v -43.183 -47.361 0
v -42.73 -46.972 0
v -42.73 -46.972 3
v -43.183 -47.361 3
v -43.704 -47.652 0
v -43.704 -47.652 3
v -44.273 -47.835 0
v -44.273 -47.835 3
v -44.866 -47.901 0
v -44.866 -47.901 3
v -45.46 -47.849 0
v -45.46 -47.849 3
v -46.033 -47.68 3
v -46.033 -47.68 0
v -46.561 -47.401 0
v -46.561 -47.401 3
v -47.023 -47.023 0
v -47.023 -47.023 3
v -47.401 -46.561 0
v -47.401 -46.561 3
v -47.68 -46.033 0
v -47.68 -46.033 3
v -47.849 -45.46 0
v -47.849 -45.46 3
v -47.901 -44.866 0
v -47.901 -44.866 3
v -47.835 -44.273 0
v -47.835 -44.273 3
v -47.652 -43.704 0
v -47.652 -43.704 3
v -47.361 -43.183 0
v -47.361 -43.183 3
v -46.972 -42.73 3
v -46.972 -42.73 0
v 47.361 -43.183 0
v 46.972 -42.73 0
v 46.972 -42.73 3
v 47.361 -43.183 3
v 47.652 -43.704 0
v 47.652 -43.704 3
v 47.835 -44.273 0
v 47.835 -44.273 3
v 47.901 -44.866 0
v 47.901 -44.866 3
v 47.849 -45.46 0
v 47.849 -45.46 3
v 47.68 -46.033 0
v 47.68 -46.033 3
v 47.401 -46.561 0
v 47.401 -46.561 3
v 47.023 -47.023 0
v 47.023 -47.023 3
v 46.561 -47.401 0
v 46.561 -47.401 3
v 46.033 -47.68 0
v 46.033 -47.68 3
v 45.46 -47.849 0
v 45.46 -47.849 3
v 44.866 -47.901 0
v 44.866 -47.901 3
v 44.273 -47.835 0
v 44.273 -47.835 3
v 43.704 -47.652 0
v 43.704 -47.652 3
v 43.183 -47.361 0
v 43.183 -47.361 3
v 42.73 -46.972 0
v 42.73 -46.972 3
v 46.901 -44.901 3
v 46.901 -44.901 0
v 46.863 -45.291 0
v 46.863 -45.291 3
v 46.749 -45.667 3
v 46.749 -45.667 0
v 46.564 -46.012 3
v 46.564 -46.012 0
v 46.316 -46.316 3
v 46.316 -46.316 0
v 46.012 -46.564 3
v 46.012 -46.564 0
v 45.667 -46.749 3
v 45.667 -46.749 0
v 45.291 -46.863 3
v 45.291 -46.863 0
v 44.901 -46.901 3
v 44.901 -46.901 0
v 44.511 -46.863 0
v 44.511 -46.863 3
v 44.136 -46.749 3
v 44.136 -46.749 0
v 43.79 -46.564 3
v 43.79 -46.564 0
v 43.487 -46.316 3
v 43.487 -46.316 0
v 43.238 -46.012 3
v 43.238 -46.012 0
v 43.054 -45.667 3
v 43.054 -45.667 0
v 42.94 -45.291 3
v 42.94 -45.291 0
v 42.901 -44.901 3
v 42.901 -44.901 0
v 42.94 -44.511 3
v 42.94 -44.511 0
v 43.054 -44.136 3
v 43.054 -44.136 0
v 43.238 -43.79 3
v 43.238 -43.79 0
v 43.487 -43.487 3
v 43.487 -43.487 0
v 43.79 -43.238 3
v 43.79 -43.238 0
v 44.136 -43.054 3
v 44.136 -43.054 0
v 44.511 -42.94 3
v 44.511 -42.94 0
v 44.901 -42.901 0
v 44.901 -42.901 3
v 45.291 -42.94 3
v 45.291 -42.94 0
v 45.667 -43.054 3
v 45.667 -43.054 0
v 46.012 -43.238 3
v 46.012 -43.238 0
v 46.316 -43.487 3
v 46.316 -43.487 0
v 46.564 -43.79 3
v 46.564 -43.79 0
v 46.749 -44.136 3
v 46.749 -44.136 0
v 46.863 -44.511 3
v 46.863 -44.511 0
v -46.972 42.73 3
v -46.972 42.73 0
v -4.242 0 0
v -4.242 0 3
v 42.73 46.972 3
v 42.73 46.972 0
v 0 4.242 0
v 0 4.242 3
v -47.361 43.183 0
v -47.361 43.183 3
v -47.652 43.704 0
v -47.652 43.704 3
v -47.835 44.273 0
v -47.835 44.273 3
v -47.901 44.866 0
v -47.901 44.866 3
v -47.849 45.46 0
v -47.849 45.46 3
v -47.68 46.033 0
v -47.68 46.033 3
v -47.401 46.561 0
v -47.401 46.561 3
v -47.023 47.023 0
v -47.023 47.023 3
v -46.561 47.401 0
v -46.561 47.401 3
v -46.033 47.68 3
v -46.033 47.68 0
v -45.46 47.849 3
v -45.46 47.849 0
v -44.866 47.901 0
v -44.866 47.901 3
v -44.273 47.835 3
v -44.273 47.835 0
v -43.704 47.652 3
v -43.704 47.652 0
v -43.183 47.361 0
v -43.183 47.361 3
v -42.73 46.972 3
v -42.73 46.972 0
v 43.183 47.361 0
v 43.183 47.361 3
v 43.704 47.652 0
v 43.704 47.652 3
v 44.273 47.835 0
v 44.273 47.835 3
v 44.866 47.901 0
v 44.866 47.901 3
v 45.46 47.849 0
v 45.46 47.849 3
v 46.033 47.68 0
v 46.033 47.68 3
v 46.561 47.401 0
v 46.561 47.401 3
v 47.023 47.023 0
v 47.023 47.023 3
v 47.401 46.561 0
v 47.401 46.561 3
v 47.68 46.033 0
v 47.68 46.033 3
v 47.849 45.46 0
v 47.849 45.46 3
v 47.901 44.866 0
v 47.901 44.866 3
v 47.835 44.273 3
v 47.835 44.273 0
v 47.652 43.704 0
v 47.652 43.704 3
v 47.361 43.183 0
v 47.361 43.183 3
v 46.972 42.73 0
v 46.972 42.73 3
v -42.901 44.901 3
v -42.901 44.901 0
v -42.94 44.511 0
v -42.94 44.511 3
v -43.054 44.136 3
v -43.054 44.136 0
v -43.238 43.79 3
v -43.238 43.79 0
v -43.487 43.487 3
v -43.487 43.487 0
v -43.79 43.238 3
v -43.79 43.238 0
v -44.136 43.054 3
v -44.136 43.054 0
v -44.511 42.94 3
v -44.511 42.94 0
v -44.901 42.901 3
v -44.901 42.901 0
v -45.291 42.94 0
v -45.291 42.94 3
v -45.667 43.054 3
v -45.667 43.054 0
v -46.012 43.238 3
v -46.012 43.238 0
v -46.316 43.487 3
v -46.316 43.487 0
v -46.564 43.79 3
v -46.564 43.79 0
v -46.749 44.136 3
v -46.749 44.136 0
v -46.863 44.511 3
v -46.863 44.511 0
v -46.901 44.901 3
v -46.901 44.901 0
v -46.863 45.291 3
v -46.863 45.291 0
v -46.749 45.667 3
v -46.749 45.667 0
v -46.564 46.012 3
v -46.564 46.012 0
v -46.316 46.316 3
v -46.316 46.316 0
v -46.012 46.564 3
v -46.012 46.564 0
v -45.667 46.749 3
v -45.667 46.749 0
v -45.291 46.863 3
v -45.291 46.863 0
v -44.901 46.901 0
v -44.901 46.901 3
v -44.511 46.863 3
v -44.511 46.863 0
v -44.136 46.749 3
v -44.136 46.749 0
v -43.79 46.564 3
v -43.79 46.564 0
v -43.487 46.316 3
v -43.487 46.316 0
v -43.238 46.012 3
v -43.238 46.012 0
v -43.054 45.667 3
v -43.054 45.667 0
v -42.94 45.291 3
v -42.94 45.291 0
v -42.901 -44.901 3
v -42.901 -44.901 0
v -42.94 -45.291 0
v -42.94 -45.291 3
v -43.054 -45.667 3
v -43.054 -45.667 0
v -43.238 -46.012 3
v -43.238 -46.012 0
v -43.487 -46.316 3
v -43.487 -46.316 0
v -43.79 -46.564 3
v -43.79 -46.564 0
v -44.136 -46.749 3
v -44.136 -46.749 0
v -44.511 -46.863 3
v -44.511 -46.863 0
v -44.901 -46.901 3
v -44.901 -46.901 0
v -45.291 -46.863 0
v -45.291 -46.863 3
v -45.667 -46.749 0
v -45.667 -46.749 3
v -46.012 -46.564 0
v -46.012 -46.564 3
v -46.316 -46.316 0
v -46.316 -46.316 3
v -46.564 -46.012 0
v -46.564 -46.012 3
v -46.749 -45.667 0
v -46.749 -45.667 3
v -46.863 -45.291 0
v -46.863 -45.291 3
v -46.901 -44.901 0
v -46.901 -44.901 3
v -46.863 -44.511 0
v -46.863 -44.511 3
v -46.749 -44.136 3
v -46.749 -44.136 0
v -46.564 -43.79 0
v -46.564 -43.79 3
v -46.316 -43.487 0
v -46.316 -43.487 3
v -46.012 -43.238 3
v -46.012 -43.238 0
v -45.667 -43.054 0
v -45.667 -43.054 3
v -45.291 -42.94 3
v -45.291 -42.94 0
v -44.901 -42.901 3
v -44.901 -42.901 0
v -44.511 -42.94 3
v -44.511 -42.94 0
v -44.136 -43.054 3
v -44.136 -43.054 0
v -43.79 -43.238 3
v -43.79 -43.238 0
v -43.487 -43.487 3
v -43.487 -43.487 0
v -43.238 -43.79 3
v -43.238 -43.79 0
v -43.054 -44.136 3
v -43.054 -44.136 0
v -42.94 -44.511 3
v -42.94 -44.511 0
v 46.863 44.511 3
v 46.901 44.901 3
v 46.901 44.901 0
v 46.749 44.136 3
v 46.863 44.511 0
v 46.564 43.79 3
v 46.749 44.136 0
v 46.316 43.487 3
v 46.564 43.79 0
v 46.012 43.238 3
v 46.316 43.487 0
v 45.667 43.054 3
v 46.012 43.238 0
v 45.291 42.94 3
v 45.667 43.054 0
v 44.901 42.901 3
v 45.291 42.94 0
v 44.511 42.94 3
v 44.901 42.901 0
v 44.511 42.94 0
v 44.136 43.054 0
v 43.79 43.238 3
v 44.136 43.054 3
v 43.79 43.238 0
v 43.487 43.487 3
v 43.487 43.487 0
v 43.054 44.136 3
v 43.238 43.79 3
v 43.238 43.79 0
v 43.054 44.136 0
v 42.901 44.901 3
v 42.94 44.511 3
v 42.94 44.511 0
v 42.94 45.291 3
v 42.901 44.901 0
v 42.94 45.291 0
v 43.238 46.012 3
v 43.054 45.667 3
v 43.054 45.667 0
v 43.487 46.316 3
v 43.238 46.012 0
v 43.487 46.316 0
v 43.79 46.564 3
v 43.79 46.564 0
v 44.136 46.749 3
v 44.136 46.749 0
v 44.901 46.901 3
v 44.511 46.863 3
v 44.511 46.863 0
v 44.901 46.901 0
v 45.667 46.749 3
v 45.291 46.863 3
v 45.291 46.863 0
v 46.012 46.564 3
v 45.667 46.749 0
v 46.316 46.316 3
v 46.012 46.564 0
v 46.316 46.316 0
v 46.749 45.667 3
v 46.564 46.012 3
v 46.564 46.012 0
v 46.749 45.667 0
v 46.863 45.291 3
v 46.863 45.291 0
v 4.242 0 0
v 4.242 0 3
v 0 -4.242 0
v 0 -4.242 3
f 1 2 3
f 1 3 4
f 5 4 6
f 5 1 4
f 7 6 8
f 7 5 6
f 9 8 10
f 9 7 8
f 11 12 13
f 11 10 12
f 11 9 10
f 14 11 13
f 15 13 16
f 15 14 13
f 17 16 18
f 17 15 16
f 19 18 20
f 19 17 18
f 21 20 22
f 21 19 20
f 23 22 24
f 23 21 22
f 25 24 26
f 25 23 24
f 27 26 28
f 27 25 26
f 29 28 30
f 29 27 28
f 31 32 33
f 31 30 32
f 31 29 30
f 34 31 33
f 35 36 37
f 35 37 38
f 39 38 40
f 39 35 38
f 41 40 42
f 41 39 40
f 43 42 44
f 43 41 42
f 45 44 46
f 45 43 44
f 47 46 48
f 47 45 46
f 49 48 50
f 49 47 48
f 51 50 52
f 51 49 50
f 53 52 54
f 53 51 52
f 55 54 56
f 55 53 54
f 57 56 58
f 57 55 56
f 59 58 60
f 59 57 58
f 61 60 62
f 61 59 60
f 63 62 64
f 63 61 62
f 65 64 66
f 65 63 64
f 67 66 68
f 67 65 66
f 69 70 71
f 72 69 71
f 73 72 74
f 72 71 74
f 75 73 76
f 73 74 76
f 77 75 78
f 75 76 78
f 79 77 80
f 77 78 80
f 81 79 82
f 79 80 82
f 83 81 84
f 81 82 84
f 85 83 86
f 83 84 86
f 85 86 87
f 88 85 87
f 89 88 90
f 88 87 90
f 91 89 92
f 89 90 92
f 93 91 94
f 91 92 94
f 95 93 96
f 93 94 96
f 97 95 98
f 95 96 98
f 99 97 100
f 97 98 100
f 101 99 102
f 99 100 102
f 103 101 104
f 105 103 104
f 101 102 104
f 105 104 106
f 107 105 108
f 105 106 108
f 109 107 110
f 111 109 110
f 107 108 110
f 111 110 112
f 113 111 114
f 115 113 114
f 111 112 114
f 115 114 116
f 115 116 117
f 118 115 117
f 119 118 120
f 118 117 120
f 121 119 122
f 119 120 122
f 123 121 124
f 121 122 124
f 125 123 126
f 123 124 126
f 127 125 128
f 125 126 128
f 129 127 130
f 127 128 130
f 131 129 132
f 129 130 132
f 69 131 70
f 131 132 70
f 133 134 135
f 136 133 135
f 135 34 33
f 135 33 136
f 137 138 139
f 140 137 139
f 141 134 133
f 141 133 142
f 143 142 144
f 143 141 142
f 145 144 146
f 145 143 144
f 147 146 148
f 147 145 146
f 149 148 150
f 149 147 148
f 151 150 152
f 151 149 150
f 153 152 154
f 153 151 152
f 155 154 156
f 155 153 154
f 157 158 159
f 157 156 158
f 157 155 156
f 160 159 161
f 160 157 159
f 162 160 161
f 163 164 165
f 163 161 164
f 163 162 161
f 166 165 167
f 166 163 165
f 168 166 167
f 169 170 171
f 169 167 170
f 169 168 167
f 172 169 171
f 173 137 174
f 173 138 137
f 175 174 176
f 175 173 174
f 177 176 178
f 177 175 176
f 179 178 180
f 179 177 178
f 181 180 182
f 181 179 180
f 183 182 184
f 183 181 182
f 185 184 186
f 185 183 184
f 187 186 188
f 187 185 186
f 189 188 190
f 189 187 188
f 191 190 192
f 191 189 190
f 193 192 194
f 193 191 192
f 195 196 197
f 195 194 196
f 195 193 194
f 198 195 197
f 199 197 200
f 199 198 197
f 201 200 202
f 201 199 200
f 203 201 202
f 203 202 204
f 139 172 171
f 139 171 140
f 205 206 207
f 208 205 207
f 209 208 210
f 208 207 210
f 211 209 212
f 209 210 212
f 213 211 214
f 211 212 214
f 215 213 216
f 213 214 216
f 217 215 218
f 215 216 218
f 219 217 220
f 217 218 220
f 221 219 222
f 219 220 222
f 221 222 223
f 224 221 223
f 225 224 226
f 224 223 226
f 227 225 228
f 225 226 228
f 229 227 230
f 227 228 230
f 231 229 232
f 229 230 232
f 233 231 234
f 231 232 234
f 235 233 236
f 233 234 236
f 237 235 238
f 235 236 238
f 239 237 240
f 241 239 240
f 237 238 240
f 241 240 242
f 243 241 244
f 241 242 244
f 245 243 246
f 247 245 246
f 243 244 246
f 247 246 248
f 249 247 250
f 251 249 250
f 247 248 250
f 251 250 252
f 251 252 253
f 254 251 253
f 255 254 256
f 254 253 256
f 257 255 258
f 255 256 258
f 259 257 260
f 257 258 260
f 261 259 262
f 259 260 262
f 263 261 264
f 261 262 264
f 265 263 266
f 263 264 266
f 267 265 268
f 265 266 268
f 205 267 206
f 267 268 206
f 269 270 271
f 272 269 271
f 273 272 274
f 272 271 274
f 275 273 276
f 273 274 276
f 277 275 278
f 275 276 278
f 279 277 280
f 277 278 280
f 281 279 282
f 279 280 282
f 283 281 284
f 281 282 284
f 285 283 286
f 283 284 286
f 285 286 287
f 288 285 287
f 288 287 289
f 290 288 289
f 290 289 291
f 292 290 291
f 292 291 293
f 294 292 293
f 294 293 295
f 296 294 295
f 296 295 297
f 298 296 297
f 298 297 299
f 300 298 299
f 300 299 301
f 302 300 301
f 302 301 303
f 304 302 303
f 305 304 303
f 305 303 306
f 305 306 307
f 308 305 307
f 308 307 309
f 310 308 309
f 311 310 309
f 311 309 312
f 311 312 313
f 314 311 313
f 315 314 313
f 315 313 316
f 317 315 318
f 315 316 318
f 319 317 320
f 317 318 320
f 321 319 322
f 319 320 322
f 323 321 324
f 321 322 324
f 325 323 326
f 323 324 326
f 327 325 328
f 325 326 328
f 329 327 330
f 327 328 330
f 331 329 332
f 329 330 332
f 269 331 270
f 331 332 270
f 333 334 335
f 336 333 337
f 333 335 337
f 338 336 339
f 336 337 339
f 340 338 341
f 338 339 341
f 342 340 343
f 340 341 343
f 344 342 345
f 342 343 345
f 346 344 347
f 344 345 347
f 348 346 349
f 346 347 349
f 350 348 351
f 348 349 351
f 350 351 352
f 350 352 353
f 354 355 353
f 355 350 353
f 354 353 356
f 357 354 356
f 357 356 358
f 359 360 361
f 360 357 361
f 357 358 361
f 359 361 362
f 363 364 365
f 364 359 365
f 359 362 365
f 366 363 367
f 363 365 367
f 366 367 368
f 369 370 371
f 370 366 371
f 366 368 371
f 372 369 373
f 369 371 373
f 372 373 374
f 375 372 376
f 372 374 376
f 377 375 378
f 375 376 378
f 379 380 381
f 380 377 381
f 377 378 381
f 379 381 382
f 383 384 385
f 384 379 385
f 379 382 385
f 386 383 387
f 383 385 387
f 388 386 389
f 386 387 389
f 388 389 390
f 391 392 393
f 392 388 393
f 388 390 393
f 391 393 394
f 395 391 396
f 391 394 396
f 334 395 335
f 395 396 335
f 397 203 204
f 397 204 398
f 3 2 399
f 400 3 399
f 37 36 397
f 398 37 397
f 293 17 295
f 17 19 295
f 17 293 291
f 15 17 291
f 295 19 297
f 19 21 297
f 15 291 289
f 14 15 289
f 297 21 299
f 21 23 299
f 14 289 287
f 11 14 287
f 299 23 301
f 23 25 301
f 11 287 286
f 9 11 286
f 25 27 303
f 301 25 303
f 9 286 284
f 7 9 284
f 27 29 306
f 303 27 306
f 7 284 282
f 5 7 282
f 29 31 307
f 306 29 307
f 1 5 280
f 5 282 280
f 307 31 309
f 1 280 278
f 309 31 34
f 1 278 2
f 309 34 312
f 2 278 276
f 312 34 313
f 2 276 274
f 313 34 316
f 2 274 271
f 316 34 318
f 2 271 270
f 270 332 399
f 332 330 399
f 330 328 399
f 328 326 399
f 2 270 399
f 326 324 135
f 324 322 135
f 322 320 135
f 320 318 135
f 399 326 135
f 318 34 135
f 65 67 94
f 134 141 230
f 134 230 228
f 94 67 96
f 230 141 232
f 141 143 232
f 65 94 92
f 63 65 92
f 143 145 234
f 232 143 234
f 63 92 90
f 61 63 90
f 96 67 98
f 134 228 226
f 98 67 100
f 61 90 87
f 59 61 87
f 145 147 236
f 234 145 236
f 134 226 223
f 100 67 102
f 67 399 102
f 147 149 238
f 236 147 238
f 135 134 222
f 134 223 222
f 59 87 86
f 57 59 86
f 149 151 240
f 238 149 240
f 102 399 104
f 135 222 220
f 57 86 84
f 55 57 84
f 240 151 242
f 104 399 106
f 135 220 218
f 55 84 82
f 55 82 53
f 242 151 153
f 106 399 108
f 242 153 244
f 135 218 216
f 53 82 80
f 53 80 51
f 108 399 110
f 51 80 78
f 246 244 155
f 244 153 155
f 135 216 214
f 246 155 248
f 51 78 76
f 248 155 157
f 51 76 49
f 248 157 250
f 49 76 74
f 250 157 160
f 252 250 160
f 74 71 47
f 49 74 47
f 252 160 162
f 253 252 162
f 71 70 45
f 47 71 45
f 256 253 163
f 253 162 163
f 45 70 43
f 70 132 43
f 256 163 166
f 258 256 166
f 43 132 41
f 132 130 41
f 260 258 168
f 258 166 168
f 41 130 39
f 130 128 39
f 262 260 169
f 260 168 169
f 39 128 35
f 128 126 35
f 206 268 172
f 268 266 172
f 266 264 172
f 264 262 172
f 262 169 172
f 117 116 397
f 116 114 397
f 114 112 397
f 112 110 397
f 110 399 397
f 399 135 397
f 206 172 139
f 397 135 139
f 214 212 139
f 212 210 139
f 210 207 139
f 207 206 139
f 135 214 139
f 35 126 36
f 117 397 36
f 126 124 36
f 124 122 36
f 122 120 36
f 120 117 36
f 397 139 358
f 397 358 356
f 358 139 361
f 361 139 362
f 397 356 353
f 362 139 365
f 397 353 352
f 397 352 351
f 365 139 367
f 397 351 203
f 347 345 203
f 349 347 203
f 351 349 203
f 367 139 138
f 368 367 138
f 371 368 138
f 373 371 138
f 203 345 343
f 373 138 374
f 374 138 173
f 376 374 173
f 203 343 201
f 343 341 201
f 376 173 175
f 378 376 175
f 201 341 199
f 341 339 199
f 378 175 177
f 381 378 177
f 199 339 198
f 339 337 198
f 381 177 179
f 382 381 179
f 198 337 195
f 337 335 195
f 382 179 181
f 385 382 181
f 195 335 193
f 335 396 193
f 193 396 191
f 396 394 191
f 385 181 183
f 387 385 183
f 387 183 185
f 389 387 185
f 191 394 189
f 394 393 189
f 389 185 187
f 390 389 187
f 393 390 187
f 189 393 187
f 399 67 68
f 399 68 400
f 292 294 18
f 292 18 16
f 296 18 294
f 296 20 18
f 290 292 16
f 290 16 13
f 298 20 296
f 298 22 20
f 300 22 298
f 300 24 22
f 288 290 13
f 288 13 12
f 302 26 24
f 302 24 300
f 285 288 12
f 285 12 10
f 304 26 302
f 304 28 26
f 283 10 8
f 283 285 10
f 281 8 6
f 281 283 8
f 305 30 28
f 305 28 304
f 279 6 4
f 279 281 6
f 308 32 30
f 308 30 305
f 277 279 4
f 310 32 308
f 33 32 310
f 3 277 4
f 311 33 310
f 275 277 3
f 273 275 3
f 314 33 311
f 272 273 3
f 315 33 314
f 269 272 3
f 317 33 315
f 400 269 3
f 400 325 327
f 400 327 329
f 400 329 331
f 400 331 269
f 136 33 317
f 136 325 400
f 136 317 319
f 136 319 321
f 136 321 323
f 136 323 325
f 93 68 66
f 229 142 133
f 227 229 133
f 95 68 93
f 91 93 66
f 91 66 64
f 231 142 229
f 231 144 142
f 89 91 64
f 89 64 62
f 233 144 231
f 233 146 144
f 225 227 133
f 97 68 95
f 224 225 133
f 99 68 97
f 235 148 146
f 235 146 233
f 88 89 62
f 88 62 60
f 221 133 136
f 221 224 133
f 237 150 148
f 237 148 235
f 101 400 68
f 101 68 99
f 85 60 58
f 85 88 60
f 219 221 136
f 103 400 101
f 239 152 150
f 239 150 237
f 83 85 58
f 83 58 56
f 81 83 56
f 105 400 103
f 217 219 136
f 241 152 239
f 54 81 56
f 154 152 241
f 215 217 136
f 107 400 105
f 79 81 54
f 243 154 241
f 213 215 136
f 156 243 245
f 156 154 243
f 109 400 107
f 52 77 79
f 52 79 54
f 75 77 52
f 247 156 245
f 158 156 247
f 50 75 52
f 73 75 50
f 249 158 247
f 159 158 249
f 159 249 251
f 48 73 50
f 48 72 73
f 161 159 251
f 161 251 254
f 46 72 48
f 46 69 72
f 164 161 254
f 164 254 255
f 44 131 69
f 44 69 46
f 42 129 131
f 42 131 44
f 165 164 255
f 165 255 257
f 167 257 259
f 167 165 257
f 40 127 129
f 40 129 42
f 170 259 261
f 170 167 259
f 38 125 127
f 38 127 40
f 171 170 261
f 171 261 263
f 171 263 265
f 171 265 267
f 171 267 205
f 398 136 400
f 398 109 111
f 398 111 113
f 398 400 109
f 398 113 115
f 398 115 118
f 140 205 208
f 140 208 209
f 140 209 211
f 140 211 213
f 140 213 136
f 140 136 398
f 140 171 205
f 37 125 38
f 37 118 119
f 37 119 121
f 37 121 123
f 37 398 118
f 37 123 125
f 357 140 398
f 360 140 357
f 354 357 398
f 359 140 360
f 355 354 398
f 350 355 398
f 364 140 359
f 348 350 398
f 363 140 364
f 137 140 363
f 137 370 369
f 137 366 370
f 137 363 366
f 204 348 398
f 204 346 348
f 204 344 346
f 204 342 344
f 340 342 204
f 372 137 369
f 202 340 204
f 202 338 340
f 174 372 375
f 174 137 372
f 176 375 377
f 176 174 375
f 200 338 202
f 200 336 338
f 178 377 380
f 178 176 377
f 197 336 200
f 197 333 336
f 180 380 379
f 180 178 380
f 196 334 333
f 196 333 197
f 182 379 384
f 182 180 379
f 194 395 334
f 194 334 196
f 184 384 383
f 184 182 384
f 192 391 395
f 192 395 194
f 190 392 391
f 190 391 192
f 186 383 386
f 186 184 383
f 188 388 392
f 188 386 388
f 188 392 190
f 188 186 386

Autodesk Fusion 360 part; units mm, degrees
sketch "Szkic1" plane through (0, 0, 0) normal (0, 0, 1) x (1, 0, 0)
  circle A0 centre (0, 0) radius 63.5
  line L0 (0, 4.2415) -> (0, 63.5)
  line L1 (4.2415, 0) -> (63.5, 0)
  line L2 (42.78, 42.78) -> (44.9013, 44.9013)
  line L3 (42.78, -42.78) -> (44.9013, -44.9013)
  line L4 (-42.78, -42.78) -> (-44.9013, -44.9013)
  circle A1 centre (44.9013, 44.9013) radius 3
  line L5 (46.9719, 42.7304) -> (4.2415, 0)
  line L6 (42.7304, 46.9719) -> (0, 4.2415)
  line L7 (-42.7304, 46.9719) -> (0, 4.2415)
  line L8 (-46.9719, 42.7304) -> (-4.2415, 0)
  circle A2 centre (-44.9013, 44.9013) radius 3
  line L9 (46.9719, -42.7304) -> (4.2415, 0)
  line L10 (42.7304, -46.9719) -> (0, -4.2415)
  circle A3 centre (44.9013, -44.9013) radius 3
  line L11 (-42.7304, -46.9719) -> (0, -4.2415)
  line L12 (-46.9719, -42.7304) -> (-4.2415, 0)
  circle A4 centre (-44.9013, -44.9013) radius 3
  circle A5 centre (-44.9013, 44.9013) radius 2
  circle A6 centre (44.9013, 44.9013) radius 2
  circle A7 centre (44.9013, -44.9013) radius 2
  circle A8 centre (-44.9013, -44.9013) radius 2
  dimension "d2" = 135
  dimension "d3" = 6
  dimension "d4" = 4
  dimension "d5" = 4
  dimension "d6" = 4
  dimension "d7" = 4
extrude "Wyciągnięcie proste1" add sketch "Szkic1" along normal blind 3 contours A0 L2 A1 A6 | A1 L5 L6 L7 L8 A2 L9 L10 A3 L11 L12 A4 | A0 A1 A6 | A0 A3 A7 | A0 L3 A3 A7 | A0 L2 A1 A6 | A0 L3 A3 A7 | A0 A4 A8 | A0 L4 A4 A8 | A0 A2 A5 | A0 A2 A5 | A0 L4 A4 A8
equation "d2 = 90 deg + 45 deg"
